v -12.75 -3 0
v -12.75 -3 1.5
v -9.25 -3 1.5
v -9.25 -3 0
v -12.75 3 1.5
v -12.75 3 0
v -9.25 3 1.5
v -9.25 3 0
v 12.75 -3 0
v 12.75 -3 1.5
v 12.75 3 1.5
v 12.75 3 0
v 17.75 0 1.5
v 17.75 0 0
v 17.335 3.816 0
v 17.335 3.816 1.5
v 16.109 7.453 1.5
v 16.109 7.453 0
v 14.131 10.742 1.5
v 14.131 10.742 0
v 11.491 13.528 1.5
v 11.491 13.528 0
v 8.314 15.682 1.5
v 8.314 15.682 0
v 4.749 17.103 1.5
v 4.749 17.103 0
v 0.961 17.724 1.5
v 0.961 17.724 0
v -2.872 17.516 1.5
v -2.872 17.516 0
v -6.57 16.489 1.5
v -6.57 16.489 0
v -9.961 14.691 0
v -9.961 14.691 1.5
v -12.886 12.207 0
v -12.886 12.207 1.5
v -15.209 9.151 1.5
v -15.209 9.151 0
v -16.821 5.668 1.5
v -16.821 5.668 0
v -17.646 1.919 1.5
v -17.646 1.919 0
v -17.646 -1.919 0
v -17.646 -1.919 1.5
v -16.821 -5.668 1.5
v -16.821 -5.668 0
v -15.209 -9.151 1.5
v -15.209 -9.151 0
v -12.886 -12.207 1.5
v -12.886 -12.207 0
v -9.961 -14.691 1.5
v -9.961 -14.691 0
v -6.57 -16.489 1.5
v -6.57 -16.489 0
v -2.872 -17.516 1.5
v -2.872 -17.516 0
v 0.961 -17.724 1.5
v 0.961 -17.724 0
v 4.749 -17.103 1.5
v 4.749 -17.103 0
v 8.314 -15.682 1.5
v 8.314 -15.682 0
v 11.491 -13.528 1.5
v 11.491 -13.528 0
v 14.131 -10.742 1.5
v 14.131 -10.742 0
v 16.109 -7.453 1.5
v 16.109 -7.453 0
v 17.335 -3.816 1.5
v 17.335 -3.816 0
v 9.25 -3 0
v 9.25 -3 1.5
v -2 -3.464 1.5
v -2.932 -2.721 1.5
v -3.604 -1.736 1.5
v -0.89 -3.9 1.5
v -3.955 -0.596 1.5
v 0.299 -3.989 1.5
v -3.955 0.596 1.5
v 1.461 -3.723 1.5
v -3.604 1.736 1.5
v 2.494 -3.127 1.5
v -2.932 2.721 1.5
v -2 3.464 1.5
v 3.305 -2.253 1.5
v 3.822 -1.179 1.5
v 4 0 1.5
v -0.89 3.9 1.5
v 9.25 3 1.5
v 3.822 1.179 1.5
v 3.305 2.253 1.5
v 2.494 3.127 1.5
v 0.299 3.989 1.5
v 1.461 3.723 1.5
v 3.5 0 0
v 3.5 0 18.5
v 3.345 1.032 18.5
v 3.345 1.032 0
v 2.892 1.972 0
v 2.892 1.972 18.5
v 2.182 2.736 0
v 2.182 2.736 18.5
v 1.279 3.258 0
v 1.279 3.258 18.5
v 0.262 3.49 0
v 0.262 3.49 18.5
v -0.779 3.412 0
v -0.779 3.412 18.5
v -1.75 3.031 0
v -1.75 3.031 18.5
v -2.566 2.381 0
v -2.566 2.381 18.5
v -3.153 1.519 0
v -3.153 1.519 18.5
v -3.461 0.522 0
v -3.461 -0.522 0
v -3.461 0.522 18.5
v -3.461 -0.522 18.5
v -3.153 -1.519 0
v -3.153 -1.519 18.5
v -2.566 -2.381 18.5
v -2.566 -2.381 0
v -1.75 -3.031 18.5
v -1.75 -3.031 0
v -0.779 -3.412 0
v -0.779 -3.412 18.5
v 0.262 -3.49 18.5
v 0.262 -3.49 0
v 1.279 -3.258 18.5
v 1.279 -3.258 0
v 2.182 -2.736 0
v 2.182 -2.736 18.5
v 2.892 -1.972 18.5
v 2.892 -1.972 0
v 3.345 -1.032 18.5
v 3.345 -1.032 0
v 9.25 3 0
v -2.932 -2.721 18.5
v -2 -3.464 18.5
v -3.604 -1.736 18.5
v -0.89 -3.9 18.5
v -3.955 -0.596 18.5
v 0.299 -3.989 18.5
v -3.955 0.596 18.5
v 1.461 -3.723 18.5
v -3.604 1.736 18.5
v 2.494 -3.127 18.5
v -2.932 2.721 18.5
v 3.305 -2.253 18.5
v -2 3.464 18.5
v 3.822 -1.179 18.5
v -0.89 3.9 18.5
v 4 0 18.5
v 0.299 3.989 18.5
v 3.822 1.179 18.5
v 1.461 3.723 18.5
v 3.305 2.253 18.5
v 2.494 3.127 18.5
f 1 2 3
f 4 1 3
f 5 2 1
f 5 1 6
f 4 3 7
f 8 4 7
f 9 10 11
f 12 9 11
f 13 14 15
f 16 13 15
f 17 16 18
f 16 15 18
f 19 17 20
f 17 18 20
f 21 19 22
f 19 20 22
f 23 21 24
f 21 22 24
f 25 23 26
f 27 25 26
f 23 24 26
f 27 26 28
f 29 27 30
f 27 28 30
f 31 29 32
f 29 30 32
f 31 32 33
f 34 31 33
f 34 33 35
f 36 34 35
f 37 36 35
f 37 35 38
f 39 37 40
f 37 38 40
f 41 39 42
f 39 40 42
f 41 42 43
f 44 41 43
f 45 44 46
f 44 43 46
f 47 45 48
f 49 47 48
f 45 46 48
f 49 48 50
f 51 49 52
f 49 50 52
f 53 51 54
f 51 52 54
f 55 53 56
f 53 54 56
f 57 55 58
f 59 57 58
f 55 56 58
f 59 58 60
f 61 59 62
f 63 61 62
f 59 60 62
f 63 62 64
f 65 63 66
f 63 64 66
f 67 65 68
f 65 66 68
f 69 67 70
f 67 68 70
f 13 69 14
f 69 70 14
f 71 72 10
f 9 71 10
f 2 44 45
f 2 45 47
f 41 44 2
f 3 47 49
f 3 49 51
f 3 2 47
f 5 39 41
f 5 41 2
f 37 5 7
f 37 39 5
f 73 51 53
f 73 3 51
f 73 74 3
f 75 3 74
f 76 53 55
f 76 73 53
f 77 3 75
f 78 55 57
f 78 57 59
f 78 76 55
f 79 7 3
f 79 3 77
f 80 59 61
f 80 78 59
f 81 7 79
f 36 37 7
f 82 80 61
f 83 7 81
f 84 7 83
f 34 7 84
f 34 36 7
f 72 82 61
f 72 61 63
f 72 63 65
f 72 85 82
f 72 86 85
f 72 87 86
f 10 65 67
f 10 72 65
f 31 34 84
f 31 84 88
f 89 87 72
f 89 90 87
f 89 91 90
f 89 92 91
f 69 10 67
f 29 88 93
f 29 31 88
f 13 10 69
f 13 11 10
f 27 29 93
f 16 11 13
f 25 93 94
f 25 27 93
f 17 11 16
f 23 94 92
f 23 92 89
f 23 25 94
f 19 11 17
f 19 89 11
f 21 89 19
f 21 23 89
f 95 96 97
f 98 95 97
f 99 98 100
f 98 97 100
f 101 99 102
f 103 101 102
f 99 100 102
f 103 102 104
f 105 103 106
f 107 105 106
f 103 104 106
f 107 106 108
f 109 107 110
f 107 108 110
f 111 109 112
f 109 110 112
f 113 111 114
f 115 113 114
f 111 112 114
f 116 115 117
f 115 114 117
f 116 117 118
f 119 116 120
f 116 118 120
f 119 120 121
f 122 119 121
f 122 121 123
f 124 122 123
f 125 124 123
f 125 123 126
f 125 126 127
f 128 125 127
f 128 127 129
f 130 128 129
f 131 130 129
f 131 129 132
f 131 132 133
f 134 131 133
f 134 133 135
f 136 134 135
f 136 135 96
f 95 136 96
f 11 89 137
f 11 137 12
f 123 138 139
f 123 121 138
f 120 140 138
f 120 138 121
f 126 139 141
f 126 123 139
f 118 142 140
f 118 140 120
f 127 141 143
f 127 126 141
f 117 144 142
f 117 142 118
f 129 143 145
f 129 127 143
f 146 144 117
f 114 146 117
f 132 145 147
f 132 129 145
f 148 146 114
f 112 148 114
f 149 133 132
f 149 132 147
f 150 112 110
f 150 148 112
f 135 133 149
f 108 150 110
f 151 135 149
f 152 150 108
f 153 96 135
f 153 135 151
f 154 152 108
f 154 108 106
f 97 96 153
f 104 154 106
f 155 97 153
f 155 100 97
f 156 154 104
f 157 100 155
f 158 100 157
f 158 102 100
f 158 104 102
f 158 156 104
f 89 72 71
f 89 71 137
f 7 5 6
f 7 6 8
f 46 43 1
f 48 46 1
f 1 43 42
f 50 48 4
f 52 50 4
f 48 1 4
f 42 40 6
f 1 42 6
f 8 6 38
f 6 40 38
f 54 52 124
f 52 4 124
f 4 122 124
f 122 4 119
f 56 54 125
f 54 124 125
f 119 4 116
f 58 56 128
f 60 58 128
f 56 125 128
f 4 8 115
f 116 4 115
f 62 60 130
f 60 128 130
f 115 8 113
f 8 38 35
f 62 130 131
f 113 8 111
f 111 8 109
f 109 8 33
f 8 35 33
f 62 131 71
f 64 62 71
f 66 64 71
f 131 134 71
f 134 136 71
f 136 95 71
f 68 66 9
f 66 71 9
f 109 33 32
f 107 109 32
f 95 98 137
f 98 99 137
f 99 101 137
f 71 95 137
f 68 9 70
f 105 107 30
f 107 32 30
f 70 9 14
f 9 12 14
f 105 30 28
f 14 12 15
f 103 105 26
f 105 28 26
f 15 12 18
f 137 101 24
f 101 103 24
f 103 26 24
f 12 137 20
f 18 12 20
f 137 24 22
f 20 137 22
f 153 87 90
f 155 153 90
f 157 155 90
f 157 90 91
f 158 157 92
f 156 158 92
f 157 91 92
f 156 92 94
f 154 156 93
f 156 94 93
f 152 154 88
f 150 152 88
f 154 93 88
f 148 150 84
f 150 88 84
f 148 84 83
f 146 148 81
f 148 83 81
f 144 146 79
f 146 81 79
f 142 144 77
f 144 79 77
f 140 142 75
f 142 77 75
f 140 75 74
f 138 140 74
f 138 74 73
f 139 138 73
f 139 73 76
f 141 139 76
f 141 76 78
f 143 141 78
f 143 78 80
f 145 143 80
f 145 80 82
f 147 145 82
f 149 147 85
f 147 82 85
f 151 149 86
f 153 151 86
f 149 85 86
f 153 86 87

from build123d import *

# Parameters (mm, degrees)
SKETCH1_R           = 17.75
BOSS_EXTRUDE1_DEPTH = 1.5
SKETCH2_R           = 4
BOSS_EXTRUDE2_DEPTH = 17
SKETCH4_R           = 3.5
SKETCH4_W           = 3.5
SKETCH4_H           = 6
CUT_EXTRUDE1_DEPTH  = 32.182928022


with BuildPart() as part:
    # Sketch1 → Boss-Extrude1 (new body)
    with BuildSketch(Plane.XY):
        Circle(SKETCH1_R)
    extrude(amount=BOSS_EXTRUDE1_DEPTH)

    # Sketch2 → Boss-Extrude2 (add)
    with BuildSketch(Plane.XY.offset(1.5)):
        Circle(SKETCH2_R)
    extrude(amount=BOSS_EXTRUDE2_DEPTH)

    # Sketch4 → Cut-Extrude1 (cut, through all)
    with BuildSketch(Plane.XY.offset(18.5)):
        Circle(SKETCH4_R)
        with Locations((-11, 0)):
            Rectangle(SKETCH4_W, SKETCH4_H)
        with Locations((11, 0)):
            Rectangle(SKETCH4_W, SKETCH4_H)
    extrude(amount=-CUT_EXTRUDE1_DEPTH, mode=Mode.SUBTRACT)


solid = part.part
